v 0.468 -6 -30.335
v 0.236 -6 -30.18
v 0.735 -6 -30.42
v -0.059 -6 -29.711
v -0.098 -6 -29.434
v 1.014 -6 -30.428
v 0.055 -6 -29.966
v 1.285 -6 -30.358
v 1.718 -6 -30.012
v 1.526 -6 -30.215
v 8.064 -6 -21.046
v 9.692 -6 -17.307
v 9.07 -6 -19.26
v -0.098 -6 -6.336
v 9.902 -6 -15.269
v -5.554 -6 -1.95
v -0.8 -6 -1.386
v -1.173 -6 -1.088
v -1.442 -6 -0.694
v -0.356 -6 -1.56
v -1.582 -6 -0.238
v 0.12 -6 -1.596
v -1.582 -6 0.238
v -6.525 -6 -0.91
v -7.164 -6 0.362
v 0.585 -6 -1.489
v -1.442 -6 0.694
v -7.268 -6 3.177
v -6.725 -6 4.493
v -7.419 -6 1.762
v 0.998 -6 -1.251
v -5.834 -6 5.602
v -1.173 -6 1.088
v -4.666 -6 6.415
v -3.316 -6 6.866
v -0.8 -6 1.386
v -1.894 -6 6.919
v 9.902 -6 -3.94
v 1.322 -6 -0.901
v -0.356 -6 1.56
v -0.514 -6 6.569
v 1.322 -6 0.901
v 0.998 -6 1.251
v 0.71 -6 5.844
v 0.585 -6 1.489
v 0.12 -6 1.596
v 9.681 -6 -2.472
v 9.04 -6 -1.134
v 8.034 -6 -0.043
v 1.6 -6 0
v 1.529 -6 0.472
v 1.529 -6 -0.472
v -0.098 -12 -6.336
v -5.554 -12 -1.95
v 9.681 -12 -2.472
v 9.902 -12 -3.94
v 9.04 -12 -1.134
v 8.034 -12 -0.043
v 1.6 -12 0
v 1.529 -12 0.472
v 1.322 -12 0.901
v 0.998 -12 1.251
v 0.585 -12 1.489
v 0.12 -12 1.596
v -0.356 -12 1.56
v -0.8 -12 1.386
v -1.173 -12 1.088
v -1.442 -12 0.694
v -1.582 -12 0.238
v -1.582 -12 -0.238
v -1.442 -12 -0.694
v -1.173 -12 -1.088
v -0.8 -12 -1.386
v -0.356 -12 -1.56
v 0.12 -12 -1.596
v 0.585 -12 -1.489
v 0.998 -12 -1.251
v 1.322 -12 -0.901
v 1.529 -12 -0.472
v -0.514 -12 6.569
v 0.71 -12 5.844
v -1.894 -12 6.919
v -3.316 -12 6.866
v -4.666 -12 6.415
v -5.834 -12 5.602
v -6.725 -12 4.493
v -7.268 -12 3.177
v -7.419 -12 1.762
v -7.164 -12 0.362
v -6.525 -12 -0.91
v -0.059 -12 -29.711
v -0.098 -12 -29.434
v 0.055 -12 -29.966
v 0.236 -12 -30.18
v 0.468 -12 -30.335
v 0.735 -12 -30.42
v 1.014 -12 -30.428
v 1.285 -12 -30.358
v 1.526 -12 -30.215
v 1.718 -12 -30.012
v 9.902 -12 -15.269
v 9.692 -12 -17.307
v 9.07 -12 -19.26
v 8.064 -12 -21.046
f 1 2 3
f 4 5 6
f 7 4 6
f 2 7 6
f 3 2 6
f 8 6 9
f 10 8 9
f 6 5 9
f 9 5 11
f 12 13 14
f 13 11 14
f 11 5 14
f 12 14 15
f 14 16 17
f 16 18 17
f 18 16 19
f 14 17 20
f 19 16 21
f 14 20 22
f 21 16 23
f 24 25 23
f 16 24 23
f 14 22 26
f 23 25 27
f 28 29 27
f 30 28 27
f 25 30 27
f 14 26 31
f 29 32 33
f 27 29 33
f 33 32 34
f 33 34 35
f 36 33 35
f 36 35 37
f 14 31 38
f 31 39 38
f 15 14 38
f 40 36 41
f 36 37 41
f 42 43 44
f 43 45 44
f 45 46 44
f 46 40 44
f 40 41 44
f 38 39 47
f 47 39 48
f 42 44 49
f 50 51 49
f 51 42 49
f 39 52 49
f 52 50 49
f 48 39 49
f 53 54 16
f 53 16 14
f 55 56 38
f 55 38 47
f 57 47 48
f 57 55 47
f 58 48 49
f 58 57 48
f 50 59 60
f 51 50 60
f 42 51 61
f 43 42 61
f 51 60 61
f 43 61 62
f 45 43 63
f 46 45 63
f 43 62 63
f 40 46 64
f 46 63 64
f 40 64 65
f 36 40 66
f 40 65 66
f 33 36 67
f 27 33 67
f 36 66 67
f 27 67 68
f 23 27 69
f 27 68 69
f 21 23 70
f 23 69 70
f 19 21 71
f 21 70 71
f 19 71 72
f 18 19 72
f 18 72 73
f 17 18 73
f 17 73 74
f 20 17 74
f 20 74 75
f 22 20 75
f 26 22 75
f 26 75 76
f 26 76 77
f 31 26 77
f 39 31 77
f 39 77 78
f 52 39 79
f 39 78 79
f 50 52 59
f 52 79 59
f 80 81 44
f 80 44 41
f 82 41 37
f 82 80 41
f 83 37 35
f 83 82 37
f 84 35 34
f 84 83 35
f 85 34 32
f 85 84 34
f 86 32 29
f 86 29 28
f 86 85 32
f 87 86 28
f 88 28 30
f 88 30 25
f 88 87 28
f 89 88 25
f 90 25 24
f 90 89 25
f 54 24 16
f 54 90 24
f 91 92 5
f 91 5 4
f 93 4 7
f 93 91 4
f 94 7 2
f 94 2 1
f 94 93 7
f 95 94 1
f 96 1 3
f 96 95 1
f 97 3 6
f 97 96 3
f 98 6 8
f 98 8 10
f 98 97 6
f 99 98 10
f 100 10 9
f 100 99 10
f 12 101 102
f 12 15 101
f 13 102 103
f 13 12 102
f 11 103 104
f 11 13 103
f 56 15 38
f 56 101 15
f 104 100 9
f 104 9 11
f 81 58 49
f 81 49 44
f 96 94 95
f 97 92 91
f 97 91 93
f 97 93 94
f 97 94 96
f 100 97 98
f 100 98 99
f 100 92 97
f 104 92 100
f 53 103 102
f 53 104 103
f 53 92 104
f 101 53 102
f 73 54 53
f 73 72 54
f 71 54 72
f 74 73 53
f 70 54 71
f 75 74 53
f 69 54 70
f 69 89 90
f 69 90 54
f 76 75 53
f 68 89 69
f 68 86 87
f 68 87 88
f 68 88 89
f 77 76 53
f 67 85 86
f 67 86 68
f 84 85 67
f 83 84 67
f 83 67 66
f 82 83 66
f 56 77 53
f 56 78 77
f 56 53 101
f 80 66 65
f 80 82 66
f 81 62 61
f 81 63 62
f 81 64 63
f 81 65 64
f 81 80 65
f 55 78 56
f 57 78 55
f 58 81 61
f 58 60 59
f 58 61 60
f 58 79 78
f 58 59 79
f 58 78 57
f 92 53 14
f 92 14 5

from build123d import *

# Parameters (mm, degrees)
ESBO_O1_R                = 1.6
RESSALTO_EXTRUS_O1_DEPTH = 6
RESSALTO_EXTRUS_O2_DEPTH = 6
FILETE1_R                = 10


with BuildPart() as part:
    # Esboço1 → Ressalto-extrusão1 (new body)
    with BuildSketch(Plane.XZ.offset(12)):
        with BuildLine():
            Line((-5.554408486, -1.950425304), (-0.098401843, -6.33585476))
            Line((-0.098401843, -6.33585476), (-0.098401843, -23.434191187))
            ThreePointArc((-0.098401843, -23.434191187), (0.884517689, -24.84224935), (2.545101876, -24.404963685))
            ThreePointArc((2.545101876, -24.404963685), (6.090429059, -19.835978921), (9.220727662, -14.973243345))
            ThreePointArc((9.220727662, -14.973243345), (9.728380083, -13.758965882), (9.901598157, -12.454291119))
            Line((9.901598157, -12.454291119), (9.901598157, -3.939806958))
            ThreePointArc((9.901598157, -3.939806958), (9.410602928, -1.779048764), (8.034047768, -0.042659356))
            Line((8.034047768, -0.042659356), (0.710490736, 5.843869901))
            ThreePointArc((0.710490736, 5.843869901), (-6.319106477, 5.07917191), (-5.554408486, -1.950425304))
        make_face()
        Circle(ESBO_O1_R, mode=Mode.SUBTRACT)
    extrude(amount=-RESSALTO_EXTRUS_O1_DEPTH)

    # Esboço2 → Ressalto-extrusão2 (add)
    with BuildSketch(Plane.XZ.offset(12)):
        with BuildLine():
            ThreePointArc((2.545101876, -24.404963685), (0.884517689, -24.84224935), (-0.098401843, -23.434191187))
            Line((-0.098401843, -23.434191187), (-0.098401843, -29.434191187))
            ThreePointArc((-0.098401843, -29.434191187), (0.598477482, -30.387143367), (1.71783387, -30.011910201))
            Line((1.71783387, -30.011910201), (9.901598157, -18.449402273))
            Line((9.901598157, -18.449402273), (9.901598157, -12.454291119))
            ThreePointArc((9.901598157, -12.454291119), (9.728380083, -13.758965882), (9.220727662, -14.973243345))
            ThreePointArc((9.220727662, -14.973243345), (6.090429059, -19.835978921), (2.545101876, -24.404963685))
        make_face()
    extrude(amount=-RESSALTO_EXTRUS_O2_DEPTH)

    # Filete1
    filete1_edges = [part.edges().sort_by_distance(p)[0] for p in [
        (9.901598157, -9, -18.449402273),
    ]]
    fillet(filete1_edges, radius=FILETE1_R)


solid = part.part
